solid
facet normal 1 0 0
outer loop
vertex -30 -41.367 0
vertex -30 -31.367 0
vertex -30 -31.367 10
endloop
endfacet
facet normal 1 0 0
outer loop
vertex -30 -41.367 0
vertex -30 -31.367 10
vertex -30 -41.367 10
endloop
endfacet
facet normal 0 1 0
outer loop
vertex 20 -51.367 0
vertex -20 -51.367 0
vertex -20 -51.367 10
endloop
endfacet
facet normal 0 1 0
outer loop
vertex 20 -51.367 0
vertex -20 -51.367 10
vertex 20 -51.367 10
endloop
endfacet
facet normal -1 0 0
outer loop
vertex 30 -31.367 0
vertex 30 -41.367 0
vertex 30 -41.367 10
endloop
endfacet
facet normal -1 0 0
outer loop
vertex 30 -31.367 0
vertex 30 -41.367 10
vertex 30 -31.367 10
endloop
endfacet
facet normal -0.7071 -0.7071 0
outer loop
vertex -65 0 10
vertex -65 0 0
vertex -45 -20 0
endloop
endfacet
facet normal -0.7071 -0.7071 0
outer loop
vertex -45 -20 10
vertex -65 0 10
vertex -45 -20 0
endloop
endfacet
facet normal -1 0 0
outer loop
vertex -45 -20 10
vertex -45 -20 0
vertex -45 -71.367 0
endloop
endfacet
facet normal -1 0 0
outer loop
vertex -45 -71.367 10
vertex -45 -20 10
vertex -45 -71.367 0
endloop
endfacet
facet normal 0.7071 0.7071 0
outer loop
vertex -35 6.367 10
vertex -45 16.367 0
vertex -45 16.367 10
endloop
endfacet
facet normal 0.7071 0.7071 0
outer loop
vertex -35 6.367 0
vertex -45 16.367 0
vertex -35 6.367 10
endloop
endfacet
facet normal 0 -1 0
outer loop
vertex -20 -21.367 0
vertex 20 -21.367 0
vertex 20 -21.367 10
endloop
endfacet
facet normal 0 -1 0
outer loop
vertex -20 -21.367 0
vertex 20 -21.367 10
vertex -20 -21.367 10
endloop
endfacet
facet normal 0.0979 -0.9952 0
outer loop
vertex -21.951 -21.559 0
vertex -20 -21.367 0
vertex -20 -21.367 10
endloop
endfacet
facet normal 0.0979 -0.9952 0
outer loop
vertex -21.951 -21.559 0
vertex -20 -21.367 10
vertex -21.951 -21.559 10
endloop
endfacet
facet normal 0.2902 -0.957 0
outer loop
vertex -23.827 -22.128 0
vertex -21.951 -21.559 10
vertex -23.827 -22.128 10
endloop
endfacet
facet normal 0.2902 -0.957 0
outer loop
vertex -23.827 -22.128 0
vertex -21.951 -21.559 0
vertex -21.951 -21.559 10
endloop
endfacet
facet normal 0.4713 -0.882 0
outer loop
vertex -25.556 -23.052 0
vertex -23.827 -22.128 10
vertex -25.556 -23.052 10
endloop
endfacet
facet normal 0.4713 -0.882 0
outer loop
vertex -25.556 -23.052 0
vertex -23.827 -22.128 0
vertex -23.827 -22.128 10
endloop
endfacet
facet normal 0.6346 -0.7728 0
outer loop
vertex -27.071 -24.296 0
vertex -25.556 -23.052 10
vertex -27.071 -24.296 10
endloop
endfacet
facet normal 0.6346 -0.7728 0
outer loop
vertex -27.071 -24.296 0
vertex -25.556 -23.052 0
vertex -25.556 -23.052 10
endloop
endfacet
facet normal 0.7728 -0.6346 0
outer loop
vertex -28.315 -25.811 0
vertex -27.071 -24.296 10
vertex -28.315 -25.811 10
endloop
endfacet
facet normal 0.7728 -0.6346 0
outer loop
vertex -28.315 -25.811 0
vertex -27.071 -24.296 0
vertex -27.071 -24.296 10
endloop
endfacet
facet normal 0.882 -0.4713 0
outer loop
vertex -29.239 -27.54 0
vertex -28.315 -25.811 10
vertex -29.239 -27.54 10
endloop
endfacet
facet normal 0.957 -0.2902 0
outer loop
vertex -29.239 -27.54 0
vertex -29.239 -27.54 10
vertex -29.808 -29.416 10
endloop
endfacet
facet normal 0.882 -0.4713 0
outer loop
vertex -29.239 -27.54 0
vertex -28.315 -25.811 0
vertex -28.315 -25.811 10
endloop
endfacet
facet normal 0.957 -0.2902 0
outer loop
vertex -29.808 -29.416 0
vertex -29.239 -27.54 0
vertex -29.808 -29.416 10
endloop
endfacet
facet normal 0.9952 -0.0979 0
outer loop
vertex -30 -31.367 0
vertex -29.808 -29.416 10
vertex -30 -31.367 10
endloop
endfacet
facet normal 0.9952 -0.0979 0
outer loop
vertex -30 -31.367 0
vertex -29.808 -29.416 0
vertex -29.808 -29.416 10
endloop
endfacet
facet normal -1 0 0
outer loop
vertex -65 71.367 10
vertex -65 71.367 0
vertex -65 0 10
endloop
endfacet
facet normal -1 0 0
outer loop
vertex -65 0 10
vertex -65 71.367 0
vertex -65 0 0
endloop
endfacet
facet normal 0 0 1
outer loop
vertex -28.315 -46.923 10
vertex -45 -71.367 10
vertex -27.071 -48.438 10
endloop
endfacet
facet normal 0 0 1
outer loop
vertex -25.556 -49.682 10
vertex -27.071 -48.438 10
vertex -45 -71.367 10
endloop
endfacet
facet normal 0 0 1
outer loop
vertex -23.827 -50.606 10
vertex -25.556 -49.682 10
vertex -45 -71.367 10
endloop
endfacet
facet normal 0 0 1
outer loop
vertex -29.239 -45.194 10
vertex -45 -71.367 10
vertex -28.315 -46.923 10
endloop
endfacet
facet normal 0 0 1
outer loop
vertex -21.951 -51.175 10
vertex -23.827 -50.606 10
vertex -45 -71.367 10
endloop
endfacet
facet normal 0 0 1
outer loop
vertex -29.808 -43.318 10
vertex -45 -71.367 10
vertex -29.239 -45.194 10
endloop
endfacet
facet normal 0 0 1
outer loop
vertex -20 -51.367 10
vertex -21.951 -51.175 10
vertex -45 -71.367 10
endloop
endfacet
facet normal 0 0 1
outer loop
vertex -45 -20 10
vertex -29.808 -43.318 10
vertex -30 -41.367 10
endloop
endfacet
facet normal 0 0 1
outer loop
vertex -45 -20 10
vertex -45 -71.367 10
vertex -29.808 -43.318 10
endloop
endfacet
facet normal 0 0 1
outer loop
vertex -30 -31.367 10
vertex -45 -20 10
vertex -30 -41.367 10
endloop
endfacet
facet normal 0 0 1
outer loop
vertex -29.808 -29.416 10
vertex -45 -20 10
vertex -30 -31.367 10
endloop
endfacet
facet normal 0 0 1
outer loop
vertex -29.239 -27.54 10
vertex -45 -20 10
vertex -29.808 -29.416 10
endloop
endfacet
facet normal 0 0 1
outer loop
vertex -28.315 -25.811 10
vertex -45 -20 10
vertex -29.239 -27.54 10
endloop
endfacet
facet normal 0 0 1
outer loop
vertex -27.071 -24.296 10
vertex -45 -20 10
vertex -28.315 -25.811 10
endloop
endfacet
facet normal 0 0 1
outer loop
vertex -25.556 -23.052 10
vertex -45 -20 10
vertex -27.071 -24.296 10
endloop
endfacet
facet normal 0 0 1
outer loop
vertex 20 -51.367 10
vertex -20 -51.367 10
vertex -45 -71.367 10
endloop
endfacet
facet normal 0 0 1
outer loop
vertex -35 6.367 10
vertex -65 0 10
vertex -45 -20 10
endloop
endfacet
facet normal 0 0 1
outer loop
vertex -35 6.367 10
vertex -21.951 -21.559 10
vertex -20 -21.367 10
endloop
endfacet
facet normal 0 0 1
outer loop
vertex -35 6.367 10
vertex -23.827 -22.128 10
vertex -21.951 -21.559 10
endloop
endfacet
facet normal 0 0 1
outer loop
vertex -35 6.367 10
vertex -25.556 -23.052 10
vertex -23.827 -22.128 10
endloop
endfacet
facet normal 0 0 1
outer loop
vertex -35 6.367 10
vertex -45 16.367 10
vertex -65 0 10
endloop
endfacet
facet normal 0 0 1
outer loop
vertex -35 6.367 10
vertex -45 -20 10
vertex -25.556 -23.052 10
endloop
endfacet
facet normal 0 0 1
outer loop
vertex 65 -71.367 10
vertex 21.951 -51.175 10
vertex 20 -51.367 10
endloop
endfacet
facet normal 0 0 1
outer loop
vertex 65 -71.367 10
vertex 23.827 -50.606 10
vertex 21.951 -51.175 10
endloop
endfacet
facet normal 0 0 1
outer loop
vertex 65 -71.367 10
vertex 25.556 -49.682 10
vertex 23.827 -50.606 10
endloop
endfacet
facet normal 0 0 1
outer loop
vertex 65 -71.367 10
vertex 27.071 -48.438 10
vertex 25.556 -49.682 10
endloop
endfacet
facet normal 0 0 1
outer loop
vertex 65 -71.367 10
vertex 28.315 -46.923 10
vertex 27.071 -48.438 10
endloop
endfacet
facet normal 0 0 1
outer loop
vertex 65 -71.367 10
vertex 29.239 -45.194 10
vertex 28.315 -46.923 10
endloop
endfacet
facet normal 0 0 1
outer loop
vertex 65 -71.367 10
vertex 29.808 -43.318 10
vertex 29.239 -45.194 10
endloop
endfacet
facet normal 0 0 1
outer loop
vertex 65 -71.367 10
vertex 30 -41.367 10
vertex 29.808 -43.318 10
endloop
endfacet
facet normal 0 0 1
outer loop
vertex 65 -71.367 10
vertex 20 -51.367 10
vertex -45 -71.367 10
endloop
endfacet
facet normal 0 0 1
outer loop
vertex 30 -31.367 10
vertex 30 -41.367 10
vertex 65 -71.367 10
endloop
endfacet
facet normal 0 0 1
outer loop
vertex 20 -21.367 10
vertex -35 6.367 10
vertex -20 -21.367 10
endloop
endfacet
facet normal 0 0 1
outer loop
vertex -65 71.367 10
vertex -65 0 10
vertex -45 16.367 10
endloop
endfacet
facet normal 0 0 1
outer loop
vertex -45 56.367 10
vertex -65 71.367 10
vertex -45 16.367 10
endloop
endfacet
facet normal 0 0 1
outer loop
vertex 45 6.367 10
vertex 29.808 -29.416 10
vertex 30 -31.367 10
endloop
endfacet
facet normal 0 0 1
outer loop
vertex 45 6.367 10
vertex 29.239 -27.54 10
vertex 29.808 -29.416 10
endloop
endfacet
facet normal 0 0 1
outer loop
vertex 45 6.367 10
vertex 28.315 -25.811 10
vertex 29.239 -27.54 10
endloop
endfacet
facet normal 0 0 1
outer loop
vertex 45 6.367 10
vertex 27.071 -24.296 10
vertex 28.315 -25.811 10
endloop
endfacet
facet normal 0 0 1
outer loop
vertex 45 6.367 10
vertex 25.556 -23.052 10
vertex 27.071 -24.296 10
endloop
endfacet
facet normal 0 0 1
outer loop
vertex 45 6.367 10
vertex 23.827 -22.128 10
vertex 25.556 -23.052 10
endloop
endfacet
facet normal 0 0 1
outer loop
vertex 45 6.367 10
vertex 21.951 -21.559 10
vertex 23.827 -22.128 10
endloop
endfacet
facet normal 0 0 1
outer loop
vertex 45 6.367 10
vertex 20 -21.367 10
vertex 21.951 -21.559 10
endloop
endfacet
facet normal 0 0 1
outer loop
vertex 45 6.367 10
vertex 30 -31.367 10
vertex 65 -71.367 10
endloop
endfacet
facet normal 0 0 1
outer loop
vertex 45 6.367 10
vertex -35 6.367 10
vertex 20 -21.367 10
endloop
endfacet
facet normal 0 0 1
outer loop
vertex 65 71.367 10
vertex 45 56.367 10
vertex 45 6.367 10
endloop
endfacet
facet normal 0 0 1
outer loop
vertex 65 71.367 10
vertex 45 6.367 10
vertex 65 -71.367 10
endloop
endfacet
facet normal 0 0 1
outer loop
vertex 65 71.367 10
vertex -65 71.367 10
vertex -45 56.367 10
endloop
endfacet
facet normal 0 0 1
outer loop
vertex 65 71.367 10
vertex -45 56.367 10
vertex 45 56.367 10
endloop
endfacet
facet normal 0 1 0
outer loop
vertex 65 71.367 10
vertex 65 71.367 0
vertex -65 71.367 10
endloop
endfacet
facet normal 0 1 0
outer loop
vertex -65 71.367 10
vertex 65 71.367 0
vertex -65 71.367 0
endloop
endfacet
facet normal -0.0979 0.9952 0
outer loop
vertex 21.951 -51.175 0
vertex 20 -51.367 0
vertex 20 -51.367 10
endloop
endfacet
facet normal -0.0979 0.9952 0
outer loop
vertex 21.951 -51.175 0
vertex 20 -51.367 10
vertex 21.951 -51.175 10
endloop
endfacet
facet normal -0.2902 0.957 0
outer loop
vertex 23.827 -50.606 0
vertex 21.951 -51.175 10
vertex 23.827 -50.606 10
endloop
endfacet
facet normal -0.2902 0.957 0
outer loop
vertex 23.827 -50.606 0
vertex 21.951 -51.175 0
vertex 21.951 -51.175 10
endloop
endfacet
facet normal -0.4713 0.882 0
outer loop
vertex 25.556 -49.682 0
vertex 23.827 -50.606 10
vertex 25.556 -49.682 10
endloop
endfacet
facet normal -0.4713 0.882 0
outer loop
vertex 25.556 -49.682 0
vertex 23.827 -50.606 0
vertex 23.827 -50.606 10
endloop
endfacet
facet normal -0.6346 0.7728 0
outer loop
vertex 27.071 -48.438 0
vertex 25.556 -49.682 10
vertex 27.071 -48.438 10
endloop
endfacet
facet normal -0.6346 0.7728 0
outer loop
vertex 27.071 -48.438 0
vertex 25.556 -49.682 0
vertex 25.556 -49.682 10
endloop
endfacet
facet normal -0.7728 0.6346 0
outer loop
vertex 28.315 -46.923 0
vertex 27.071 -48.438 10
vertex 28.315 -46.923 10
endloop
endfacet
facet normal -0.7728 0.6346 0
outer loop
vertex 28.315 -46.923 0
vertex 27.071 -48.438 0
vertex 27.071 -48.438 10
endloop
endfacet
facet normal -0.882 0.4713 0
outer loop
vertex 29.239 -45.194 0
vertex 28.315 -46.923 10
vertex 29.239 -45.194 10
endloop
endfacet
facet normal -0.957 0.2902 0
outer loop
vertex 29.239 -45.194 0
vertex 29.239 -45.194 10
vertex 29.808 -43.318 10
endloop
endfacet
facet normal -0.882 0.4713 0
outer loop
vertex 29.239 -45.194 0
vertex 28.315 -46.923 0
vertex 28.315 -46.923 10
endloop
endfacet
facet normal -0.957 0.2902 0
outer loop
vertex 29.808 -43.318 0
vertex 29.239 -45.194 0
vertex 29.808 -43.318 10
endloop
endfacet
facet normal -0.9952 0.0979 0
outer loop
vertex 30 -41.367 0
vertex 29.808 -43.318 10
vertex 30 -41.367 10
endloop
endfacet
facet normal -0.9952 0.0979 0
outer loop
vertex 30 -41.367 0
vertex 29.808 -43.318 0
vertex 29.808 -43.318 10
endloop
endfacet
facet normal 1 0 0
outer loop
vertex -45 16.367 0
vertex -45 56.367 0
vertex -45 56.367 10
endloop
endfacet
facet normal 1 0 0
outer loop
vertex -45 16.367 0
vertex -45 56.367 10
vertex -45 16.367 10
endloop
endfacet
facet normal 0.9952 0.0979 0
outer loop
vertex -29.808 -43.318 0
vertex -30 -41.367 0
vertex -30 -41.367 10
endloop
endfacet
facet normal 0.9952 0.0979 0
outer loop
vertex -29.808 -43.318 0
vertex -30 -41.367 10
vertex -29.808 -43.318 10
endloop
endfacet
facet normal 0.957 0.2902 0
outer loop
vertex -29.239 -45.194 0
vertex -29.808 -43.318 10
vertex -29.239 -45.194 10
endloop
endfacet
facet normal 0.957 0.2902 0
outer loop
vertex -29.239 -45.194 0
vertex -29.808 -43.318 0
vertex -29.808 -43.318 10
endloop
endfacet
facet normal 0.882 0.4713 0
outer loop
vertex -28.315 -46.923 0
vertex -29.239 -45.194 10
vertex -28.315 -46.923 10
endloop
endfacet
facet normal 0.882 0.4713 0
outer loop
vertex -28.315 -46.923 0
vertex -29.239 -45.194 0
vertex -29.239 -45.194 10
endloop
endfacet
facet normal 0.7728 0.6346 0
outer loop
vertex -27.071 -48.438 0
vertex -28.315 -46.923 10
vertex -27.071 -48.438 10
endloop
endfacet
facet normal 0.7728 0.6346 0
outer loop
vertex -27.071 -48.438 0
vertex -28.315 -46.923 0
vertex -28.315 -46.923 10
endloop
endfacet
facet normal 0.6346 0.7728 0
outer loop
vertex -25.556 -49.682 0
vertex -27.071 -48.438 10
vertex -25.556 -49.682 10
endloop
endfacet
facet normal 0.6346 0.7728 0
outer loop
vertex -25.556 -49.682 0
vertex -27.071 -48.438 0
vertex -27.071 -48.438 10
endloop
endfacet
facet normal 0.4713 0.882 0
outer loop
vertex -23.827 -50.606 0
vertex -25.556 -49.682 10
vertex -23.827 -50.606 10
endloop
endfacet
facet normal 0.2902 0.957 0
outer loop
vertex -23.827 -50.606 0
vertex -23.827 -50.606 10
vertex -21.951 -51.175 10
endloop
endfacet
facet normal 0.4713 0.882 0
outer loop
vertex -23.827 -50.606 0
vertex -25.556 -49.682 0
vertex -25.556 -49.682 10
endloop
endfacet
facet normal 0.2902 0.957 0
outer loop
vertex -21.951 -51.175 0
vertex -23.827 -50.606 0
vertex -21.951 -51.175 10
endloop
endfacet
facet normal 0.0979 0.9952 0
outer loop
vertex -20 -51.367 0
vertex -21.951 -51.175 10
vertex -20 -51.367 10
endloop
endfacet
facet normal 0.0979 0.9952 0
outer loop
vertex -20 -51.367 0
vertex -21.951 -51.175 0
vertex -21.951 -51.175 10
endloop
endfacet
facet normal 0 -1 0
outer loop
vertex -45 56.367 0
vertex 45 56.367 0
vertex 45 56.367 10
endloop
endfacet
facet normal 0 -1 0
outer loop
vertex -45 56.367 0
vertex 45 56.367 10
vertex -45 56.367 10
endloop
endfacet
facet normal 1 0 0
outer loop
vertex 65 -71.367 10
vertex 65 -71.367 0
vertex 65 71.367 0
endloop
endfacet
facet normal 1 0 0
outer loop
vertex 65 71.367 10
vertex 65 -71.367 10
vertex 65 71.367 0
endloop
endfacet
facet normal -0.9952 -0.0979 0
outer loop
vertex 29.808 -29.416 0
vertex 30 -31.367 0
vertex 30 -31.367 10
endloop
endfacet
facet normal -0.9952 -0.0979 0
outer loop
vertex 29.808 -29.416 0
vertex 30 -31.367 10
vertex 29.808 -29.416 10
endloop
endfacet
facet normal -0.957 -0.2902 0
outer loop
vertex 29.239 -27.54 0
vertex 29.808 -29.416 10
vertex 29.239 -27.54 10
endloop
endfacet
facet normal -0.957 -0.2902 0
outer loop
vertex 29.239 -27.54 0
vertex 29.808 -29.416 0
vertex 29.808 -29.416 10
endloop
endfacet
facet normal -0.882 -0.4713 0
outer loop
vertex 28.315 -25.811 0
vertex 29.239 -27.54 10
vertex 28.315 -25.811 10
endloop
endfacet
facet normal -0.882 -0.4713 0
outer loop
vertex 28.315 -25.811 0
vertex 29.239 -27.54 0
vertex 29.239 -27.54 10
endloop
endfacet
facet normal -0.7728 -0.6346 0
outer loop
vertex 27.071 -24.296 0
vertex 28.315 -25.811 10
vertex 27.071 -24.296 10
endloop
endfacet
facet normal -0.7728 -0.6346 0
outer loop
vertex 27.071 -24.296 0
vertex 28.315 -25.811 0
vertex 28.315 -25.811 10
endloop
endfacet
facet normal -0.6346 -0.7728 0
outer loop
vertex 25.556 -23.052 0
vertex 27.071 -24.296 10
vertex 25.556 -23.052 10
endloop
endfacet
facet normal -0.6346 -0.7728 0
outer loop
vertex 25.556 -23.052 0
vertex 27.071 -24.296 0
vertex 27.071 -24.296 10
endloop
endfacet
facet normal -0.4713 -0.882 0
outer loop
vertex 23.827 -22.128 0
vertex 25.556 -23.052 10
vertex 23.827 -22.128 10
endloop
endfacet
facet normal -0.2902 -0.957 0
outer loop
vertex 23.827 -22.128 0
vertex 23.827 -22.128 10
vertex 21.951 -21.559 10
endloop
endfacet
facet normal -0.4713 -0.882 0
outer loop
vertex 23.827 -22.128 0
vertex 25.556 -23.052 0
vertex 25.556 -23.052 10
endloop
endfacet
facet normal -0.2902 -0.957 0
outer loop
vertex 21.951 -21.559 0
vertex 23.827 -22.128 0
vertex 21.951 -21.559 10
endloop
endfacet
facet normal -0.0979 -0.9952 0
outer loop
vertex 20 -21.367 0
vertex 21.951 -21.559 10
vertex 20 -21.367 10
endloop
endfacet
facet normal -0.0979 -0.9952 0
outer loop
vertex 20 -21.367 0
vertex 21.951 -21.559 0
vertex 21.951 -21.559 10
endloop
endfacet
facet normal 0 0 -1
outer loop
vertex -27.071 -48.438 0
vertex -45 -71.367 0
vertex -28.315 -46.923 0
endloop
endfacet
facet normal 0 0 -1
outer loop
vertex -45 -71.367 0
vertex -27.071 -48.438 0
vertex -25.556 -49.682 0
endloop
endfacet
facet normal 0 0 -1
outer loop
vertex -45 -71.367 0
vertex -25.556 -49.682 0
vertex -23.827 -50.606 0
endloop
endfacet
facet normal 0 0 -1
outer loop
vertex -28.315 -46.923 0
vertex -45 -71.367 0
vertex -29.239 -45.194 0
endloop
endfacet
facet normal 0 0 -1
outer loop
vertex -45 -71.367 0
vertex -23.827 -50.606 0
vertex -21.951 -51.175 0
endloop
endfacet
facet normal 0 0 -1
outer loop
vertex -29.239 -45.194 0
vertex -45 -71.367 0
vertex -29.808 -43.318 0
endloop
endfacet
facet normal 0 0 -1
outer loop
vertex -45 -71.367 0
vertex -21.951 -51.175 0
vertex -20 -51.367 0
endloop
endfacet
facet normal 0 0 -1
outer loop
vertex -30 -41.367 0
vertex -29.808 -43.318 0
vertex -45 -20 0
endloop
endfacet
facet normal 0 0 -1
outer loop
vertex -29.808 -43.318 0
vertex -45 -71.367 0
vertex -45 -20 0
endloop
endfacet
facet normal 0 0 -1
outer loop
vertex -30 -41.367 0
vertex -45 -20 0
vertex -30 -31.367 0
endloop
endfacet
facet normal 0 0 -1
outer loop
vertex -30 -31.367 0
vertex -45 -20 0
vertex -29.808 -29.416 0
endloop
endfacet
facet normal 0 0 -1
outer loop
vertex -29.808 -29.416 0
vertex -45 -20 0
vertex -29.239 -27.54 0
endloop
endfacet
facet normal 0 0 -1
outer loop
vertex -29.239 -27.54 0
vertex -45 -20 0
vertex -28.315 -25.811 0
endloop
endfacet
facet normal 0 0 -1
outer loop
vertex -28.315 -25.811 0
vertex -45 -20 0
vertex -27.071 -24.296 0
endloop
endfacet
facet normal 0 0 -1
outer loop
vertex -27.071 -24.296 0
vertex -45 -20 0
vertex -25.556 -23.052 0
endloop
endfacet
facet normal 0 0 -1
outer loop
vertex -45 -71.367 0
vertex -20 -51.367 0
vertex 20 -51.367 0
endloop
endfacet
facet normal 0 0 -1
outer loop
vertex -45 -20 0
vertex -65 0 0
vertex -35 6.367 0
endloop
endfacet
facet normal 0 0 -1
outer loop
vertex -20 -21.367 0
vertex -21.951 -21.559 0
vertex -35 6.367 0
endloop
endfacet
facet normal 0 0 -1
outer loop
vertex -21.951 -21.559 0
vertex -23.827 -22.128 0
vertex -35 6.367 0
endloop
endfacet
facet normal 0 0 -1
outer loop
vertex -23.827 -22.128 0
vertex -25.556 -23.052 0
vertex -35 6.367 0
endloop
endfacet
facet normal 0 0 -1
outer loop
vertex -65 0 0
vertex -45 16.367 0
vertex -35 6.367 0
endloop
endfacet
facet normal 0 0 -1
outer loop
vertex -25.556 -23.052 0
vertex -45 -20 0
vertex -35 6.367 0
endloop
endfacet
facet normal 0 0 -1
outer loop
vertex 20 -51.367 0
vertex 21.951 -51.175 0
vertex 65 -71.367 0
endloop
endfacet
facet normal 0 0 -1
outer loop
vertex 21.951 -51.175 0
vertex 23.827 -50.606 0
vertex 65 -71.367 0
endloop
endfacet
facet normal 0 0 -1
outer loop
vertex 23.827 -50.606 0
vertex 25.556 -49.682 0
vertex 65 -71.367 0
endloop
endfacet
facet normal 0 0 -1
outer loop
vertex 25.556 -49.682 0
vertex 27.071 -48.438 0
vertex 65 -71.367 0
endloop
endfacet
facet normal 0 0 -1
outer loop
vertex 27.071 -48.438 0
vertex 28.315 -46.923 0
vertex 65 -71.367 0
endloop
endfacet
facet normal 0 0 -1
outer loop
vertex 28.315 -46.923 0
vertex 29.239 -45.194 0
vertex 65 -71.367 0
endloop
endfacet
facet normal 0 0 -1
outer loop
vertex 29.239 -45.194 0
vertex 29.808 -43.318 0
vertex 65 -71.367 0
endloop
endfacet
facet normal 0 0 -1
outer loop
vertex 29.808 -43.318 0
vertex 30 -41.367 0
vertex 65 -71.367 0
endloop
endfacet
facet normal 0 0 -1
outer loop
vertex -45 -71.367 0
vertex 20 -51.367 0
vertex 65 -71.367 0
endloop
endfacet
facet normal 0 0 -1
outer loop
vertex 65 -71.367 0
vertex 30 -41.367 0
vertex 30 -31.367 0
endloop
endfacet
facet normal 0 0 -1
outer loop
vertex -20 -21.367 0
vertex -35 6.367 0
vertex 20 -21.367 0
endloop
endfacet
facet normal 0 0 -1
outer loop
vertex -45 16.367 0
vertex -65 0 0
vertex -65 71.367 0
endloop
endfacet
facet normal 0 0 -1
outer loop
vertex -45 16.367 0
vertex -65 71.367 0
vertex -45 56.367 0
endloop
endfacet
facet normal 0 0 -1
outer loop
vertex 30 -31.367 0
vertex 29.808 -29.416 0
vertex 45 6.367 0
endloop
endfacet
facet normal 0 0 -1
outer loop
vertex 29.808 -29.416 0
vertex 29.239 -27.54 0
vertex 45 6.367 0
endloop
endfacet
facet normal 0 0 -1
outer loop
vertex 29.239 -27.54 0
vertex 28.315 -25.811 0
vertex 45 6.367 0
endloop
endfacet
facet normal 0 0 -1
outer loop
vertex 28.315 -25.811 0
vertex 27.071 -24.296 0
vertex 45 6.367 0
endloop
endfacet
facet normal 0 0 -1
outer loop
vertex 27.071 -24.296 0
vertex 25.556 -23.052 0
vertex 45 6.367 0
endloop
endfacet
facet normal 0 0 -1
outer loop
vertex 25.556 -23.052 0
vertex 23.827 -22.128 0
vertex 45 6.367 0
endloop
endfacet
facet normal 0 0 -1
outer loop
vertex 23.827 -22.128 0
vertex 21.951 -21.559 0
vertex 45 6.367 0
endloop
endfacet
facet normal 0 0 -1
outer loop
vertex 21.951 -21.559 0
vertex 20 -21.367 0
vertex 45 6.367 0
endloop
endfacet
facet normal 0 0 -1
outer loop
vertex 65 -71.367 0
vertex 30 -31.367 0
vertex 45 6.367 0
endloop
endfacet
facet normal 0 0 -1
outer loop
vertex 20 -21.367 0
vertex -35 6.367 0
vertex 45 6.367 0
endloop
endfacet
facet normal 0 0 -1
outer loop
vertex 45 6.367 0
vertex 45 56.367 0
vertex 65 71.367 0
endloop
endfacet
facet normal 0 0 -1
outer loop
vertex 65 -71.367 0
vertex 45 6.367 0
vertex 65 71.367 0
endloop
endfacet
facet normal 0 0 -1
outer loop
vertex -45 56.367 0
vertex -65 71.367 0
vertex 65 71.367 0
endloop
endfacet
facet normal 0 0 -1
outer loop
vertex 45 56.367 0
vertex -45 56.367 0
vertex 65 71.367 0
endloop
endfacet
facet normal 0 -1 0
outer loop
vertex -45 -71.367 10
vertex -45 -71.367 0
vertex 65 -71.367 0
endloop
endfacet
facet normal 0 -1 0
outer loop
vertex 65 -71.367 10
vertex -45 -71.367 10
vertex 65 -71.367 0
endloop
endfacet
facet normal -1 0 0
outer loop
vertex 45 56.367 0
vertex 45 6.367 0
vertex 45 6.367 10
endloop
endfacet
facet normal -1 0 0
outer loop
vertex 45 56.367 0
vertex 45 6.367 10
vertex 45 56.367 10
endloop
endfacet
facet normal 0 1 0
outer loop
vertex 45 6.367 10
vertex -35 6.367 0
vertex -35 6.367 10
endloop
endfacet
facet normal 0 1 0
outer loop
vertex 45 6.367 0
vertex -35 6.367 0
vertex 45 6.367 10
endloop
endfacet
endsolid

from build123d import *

# Parameters (mm, degrees)
EXTRUDE_1_DEPTH = 10


with BuildPart() as part:
    # 草图1 → 凸台-拉伸1 (new body)
    with BuildSketch(Plane.XY):
        Polygon((-65, 0), (-45, -20), (-45, -71.366959064), (65, -71.366959064), (65, 71.366959064), (-65, 71.366959064), align=None)
        Polygon((45, 56.366959064), (-45, 56.366959064), (-45, 16.366959064), (-35, 6.366959064), (45, 6.366959064), align=None, mode=Mode.SUBTRACT)
        with BuildLine():
            Line((20, -21.366959064), (-20, -21.366959064))
            ThreePointArc((-20, -21.366959064), (-27.071067812, -24.295891252), (-30, -31.366959064))
            Line((-30, -31.366959064), (-30, -41.366959064))
            ThreePointArc((-30, -41.366959064), (-27.071067812, -48.438026876), (-20, -51.366959064))
            Line((-20, -51.366959064), (20, -51.366959064))
            ThreePointArc((20, -51.366959064), (27.071067812, -48.438026876), (30, -41.366959064))
            Line((30, -41.366959064), (30, -31.366959064))
            ThreePointArc((30, -31.366959064), (27.071067812, -24.295891252), (20, -21.366959064))
        make_face(mode=Mode.SUBTRACT)
    extrude(amount=EXTRUDE_1_DEPTH)


solid = part.part
